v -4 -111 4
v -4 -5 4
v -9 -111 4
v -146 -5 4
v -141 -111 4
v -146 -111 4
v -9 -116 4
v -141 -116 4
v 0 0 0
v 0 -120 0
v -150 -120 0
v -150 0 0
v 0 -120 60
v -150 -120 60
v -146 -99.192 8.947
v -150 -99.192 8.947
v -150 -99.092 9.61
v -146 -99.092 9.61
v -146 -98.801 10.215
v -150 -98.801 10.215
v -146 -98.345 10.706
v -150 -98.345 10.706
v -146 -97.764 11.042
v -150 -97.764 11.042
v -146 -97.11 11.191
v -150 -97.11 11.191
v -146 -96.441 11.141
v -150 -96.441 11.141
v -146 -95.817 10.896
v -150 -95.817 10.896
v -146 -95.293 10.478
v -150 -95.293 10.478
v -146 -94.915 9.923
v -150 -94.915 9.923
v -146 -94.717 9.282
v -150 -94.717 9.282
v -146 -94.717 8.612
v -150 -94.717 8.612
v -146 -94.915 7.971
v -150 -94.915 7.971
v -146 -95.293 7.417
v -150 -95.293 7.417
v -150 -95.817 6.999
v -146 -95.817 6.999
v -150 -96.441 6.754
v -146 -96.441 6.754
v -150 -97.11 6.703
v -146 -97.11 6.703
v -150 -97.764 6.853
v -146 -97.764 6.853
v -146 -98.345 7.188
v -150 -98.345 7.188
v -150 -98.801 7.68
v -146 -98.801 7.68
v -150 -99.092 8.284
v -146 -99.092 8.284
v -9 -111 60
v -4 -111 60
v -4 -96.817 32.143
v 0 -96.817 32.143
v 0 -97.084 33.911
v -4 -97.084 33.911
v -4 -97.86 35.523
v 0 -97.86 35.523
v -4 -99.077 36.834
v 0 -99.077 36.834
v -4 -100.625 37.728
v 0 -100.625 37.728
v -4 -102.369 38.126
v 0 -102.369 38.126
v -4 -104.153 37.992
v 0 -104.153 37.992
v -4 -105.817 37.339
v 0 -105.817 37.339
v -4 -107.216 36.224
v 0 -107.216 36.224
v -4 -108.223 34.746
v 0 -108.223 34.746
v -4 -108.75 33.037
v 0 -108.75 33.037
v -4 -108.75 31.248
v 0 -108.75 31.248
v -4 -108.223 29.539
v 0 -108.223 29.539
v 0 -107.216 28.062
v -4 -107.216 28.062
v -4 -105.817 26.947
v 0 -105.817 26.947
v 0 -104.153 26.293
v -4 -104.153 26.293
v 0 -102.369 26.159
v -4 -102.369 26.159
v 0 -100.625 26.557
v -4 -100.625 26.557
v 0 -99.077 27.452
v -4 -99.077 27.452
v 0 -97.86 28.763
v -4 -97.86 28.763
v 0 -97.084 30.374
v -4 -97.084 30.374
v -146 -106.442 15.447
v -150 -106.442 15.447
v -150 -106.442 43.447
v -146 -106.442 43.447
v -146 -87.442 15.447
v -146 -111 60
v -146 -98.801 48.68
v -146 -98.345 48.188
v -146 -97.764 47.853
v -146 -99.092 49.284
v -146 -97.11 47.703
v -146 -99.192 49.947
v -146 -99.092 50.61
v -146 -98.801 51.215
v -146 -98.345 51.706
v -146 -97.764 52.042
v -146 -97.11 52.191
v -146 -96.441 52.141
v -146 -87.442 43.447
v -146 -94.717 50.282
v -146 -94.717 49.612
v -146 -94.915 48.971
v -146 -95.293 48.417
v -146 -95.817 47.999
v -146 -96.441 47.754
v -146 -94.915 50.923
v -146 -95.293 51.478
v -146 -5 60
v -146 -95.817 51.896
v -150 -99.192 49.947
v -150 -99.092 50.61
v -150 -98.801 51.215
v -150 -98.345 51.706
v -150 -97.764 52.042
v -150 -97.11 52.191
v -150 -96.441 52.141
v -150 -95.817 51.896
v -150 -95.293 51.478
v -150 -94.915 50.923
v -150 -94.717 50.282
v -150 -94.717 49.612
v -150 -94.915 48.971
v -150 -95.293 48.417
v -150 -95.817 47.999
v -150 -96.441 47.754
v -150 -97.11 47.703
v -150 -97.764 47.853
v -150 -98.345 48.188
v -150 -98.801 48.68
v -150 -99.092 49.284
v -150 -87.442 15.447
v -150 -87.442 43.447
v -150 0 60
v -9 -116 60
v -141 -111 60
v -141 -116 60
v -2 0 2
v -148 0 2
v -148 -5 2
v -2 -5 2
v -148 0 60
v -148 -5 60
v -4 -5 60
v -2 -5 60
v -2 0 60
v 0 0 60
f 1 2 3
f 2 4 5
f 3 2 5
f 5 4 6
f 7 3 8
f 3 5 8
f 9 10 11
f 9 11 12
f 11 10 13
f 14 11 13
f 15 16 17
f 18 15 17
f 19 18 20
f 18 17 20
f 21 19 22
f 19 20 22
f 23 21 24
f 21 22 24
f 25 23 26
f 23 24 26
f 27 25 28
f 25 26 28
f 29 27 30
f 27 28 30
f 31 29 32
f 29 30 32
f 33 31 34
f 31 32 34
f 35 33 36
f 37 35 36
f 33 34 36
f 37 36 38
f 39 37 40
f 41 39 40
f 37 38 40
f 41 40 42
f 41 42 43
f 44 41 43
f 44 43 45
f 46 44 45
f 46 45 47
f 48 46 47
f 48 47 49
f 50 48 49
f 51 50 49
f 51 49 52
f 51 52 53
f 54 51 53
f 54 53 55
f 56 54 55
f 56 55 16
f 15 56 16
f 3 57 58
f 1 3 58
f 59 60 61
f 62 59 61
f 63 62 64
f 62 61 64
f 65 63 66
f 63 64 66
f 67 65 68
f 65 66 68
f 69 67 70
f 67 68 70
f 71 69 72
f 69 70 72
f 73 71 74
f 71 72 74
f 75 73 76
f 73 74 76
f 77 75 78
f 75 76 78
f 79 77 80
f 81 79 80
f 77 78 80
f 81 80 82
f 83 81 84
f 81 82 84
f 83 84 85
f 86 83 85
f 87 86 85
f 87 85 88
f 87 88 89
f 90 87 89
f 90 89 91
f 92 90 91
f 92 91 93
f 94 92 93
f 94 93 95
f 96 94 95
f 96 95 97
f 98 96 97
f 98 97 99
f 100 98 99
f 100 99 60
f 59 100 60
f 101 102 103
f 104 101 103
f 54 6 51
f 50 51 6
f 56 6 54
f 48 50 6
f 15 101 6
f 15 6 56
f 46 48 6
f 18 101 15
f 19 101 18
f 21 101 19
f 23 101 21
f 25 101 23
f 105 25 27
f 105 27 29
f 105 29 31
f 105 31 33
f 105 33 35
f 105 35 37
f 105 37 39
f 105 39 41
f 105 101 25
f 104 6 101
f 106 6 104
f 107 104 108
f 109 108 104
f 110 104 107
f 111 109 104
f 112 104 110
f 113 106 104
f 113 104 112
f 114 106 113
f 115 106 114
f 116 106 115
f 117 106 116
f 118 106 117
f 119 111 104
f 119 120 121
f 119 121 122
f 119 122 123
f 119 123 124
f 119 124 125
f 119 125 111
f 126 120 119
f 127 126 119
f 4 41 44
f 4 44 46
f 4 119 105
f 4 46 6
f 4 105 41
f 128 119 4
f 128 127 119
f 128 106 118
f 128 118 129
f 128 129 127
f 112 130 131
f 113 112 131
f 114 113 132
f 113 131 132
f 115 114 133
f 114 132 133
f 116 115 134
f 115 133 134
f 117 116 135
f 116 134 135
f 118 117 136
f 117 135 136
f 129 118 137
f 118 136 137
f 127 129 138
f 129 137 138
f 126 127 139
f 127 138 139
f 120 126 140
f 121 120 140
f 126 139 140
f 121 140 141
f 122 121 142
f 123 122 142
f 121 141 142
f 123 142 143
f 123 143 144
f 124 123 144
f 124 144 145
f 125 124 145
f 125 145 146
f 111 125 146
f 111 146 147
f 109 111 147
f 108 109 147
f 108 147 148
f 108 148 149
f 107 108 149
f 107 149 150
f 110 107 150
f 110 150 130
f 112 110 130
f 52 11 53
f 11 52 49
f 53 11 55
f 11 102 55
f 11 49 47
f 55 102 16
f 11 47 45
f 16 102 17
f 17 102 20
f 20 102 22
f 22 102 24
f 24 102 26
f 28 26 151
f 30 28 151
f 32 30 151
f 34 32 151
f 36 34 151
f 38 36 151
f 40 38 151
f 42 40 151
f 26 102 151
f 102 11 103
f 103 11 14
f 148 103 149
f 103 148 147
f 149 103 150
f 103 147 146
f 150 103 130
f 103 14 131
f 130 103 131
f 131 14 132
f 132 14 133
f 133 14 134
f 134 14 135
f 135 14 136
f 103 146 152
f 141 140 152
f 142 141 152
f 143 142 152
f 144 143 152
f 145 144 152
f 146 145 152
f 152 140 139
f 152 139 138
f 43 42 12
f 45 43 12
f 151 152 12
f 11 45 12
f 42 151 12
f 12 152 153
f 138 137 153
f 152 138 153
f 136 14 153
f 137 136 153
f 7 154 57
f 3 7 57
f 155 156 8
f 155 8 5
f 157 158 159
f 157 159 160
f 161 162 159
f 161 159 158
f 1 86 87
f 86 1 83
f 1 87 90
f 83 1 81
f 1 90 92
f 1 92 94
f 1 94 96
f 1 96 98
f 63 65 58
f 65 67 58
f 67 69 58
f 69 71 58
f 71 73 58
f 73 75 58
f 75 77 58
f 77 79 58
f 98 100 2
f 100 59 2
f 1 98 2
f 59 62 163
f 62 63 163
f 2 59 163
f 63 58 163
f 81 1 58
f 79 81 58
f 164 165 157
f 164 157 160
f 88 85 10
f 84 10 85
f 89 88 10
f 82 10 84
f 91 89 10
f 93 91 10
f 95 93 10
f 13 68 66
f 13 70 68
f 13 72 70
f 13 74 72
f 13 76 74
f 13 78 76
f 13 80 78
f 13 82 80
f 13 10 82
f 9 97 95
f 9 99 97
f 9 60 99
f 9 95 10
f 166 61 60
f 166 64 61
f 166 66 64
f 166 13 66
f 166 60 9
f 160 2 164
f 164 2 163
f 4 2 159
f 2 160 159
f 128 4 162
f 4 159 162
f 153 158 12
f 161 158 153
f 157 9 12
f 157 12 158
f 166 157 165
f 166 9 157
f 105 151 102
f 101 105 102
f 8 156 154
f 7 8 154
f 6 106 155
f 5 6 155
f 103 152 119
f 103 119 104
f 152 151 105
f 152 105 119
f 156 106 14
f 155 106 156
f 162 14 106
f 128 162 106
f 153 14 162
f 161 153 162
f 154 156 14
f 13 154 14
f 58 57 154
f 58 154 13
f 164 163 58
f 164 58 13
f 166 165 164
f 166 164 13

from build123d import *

# Parameters (mm, degrees)
F0_W      = 120
F0_H      = 60
F0_R      = 6
F1_DEPTH  = 150
F2_W      = 142
F2_H      = 116
F3_DEPTH  = 56
F4_W      = 5
F4_H      = 56
F5_DEPTH  = 2
F6_W      = 5
F6_H      = 56
F7_DEPTH  = 2
F9_DEPTH  = 2
F10_R     = 2.25
F11_DEPTH = 11.6
F10_W     = 19
F10_H     = 28
F12_DEPTH = 25
F13_DEPTH = 25
F15_DEPTH = 20
F14_W     = 5
F14_H     = 5
F16_DEPTH = 56


with BuildPart() as f1:
    # F0 (on Right) → F1 (new body)
    with BuildSketch(Plane.YZ):
        with Locations((-60, 30)):
            Rectangle(F0_W, F0_H)
        with Locations((-102.817491, 32.142658)):
            Circle(F0_R, mode=Mode.SUBTRACT)
        with Locations((-102.817491, 32.142658)):
            Circle(F0_R)
    extrude(amount=-F1_DEPTH)

    # F2 (on face) → F3 (cut)
    with BuildSketch(Plane.XY.offset(60)):
        with Locations((-75, -58)):
            Rectangle(F2_W, F2_H)
    extrude(amount=-F3_DEPTH, mode=Mode.SUBTRACT)

    # F4 (on face) → F5 (cut)
    with BuildSketch(Plane(origin=(-4, 0, 0), x_dir=(0, -1, 0), z_dir=(-1, 0, 0))):
        with Locations((2.5, 32)):
            Rectangle(F4_W, F4_H)
    extrude(amount=-F5_DEPTH, mode=Mode.SUBTRACT)

    # F6 (on face) → F7 (cut)
    with BuildSketch(Plane.YZ.offset(-146)):
        with Locations((-2.5, 32)):
            Rectangle(F6_W, F6_H)
    extrude(amount=-F7_DEPTH, mode=Mode.SUBTRACT)

    # F8 (on face) → F9 (cut)
    with BuildSketch(Plane.XY.offset(4)):
        Polygon((-4, -5), (-2, -5), (-2, 0), (-148, 0), (-148, -5), (-146, -5), align=None)
    extrude(amount=-F9_DEPTH, mode=Mode.SUBTRACT)

    # F10 (on face) → F11 (cut)
    with BuildSketch(Plane(origin=(-150, 0, 0), x_dir=(0, -1, 0), z_dir=(-1, 0, 0))):
        with Locations((96.941963, 49.947112)):
            Circle(F10_R)
    extrude(amount=-F11_DEPTH, mode=Mode.SUBTRACT)

    # F10 (on face) → F12 (cut)
    with BuildSketch(Plane(origin=(-150, 0, 0), x_dir=(0, -1, 0), z_dir=(-1, 0, 0))):
        with Locations((96.941963, 29.447112)):
            Rectangle(F10_W, F10_H)
    extrude(amount=-F12_DEPTH, mode=Mode.SUBTRACT)

    # F10 (on face) → F13 (cut)
    with BuildSketch(Plane(origin=(-150, 0, 0), x_dir=(0, -1, 0), z_dir=(-1, 0, 0))):
        with Locations((96.941963, 8.947112)):
            Circle(F10_R)
    extrude(amount=-F13_DEPTH, mode=Mode.SUBTRACT)

    # F0 (on Right) → F15 (cut)
    with BuildSketch(Plane.YZ):
        with Locations((-102.817491, 32.142658)):
            Circle(F0_R)
    extrude(amount=-F15_DEPTH, mode=Mode.SUBTRACT)

    # F14 (on face) → F16 (join)
    with BuildSketch(Plane.XY.offset(4)):
        with Locations((-6.5, -113.5)):
            Rectangle(F14_W, F14_H)
        with Locations((-143.5, -113.5)):
            Rectangle(F14_W, F14_H)
    extrude(amount=F16_DEPTH)


solid = f1.part
